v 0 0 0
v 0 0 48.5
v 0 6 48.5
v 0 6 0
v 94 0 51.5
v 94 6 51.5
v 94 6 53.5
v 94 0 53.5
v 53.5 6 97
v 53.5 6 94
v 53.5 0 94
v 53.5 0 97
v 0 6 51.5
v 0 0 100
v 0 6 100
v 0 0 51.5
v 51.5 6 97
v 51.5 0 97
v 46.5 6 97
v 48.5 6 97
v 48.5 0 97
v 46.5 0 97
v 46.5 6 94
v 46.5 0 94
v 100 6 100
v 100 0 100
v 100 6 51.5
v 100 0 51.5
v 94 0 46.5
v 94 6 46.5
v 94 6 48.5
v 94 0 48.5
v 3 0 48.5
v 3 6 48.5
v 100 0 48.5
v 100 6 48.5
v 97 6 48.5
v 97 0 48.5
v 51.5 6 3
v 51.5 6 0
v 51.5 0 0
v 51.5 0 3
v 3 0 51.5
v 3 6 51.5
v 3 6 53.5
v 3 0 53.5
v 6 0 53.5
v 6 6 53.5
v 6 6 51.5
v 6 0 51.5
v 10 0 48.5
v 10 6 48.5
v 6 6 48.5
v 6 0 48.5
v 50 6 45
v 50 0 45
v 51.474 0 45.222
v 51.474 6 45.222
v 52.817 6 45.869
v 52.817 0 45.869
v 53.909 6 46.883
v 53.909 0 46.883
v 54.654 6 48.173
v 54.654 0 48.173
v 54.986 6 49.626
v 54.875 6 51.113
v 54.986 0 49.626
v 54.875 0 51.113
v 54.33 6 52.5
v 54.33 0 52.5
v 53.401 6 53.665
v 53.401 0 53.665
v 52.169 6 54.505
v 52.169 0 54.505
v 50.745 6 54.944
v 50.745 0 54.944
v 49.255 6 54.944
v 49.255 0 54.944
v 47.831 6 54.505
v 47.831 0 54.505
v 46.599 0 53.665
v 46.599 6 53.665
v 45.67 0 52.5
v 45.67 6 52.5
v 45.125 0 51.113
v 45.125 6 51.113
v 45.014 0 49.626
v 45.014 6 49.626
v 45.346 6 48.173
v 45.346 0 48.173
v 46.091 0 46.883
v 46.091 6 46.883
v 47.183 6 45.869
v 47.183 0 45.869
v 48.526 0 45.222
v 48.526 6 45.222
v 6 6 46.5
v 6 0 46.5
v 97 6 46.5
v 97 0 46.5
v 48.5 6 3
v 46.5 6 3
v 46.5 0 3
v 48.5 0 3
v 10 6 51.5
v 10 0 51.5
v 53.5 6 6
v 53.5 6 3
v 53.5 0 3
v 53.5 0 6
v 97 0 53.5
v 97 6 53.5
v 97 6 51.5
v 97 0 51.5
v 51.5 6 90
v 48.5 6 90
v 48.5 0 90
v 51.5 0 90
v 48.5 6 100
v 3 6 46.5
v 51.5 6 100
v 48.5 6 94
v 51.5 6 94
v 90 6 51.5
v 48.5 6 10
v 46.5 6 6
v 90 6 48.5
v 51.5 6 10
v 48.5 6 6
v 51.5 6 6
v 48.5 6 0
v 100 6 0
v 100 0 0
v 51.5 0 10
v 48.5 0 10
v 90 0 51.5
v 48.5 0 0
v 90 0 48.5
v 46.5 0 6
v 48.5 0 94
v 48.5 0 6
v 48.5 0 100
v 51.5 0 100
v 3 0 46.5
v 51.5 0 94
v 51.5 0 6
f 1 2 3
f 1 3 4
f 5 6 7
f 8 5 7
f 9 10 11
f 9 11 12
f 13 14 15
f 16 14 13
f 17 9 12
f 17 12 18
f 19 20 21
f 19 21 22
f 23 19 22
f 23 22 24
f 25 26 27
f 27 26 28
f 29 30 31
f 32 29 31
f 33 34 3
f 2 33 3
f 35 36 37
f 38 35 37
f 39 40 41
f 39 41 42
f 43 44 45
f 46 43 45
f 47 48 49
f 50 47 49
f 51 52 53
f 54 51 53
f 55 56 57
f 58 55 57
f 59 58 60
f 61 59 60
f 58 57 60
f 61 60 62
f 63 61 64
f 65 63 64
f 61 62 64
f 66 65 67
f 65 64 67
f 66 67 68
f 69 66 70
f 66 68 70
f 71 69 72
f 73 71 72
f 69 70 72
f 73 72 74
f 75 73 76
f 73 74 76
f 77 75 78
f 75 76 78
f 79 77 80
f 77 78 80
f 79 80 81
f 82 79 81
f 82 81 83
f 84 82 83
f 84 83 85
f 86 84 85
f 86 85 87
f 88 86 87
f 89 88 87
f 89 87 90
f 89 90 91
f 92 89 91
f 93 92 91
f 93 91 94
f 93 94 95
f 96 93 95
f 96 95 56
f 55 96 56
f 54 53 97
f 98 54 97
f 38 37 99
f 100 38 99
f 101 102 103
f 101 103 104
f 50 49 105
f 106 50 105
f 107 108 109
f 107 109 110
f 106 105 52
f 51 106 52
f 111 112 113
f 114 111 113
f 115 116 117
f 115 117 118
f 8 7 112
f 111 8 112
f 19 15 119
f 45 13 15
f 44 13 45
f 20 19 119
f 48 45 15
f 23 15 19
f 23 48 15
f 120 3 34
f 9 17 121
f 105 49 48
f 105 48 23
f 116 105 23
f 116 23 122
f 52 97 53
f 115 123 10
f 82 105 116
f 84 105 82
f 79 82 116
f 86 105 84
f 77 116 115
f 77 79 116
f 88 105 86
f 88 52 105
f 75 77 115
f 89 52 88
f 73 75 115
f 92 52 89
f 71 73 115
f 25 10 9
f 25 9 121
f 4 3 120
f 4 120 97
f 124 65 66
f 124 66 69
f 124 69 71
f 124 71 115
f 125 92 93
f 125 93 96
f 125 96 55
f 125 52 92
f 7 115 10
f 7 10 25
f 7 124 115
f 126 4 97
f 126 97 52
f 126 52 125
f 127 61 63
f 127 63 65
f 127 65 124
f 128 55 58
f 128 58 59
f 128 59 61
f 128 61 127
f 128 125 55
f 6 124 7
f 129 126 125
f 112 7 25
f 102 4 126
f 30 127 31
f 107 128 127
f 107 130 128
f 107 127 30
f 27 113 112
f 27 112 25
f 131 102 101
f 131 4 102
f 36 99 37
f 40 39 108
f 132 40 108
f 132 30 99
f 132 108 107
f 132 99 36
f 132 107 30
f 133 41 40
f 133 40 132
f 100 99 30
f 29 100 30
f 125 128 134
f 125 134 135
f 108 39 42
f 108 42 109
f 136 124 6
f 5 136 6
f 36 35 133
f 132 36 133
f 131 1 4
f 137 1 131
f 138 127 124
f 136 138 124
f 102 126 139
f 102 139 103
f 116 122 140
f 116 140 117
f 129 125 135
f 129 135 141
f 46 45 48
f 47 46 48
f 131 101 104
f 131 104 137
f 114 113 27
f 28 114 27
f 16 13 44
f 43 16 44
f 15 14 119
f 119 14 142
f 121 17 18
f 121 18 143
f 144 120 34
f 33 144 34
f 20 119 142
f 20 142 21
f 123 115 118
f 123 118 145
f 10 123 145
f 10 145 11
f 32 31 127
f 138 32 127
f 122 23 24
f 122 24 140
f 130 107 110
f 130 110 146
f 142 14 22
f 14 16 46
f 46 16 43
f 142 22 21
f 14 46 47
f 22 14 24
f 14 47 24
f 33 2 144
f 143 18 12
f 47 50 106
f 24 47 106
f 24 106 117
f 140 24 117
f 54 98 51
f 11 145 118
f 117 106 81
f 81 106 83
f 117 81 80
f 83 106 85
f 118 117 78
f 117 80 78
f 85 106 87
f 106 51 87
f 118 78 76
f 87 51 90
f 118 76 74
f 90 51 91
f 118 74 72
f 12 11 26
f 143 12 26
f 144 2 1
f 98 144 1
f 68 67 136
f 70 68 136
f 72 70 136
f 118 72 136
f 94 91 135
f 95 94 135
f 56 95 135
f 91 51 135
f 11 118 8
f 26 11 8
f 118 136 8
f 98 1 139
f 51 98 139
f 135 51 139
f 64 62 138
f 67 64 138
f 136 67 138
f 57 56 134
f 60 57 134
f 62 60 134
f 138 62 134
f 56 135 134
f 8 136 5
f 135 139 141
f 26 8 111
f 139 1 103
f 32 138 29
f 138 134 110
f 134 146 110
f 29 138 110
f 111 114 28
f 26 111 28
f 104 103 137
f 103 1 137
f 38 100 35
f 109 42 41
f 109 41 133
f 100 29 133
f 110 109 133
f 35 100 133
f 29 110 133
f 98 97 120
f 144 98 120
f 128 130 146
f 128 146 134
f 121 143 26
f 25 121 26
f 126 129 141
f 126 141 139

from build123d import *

# Parameters (mm, degrees)
SKETCH1_W           = 100
SKETCH1_H           = 100
BOSS_EXTRUDE1_DEPTH = 6
CUT_EXTRUDE1_DEPTH  = 142.548578234
SKETCH3_R           = 5
CUT_EXTRUDE2_DEPTH  = 10
CUT_EXTRUDE6_DEPTH  = 142.548578234


with BuildPart() as part:
    # Sketch1 → Boss-Extrude1 (new body)
    with BuildSketch(Plane(origin=(0, 0, 0), x_dir=(1, 0, 0), z_dir=(0, 1, 0))):
        with Locations((50, -50)):
            Rectangle(SKETCH1_W, SKETCH1_H)
    extrude(amount=BOSS_EXTRUDE1_DEPTH)

    # Sketch2 → Cut-Extrude1 (cut, through all)
    with BuildSketch(Plane(origin=(0, 6, 0), x_dir=(1, 0, 0), z_dir=(0, 1, 0))):
        Polygon((48.5, 0), (51.5, 0), (51.5, -3), (53.5, -3), (53.5, -6), (51.5, -6), (51.5, -10), (48.5, -10), (48.5, -6), (46.5, -6), (46.5, -3), (48.5, -3), align=None)
        Polygon((48.5, -100), (48.5, -97), (46.5, -97), (46.5, -94), (48.5, -94), (48.5, -90), (51.5, -90), (51.5, -94), (53.5, -94), (53.5, -97), (51.5, -97), (51.5, -100), align=None)
    extrude(amount=-CUT_EXTRUDE1_DEPTH, mode=Mode.SUBTRACT)

    # Sketch3 → Cut-Extrude2 (cut)
    with BuildSketch(Plane.XZ):
        with Locations(Location((50, 50, 0), (0, 0, 270))):
            Circle(SKETCH3_R)
    extrude(amount=-CUT_EXTRUDE2_DEPTH, mode=Mode.SUBTRACT)

    # Sketch5 → Cut-Extrude6 (cut, through all)
    with BuildSketch(Plane(origin=(0, 6, 0), x_dir=(1, 0, 0), z_dir=(0, 1, 0))):
        Polygon((3, -48.5), (0, -48.5), (0, -51.5), (3, -51.5), (3, -53.5), (6, -53.5), (6, -51.5), (10, -51.5), (10, -48.5), (6, -48.5), (6, -46.5), (3, -46.5), align=None)
        Polygon((90, -48.5), (90, -51.5), (94, -51.5), (94, -53.5), (97, -53.5), (97, -51.5), (100, -51.5), (100, -48.5), (97, -48.5), (97, -46.5), (94, -46.5), (94, -48.5), align=None)
    extrude(amount=-CUT_EXTRUDE6_DEPTH, mode=Mode.SUBTRACT)


solid = part.part
